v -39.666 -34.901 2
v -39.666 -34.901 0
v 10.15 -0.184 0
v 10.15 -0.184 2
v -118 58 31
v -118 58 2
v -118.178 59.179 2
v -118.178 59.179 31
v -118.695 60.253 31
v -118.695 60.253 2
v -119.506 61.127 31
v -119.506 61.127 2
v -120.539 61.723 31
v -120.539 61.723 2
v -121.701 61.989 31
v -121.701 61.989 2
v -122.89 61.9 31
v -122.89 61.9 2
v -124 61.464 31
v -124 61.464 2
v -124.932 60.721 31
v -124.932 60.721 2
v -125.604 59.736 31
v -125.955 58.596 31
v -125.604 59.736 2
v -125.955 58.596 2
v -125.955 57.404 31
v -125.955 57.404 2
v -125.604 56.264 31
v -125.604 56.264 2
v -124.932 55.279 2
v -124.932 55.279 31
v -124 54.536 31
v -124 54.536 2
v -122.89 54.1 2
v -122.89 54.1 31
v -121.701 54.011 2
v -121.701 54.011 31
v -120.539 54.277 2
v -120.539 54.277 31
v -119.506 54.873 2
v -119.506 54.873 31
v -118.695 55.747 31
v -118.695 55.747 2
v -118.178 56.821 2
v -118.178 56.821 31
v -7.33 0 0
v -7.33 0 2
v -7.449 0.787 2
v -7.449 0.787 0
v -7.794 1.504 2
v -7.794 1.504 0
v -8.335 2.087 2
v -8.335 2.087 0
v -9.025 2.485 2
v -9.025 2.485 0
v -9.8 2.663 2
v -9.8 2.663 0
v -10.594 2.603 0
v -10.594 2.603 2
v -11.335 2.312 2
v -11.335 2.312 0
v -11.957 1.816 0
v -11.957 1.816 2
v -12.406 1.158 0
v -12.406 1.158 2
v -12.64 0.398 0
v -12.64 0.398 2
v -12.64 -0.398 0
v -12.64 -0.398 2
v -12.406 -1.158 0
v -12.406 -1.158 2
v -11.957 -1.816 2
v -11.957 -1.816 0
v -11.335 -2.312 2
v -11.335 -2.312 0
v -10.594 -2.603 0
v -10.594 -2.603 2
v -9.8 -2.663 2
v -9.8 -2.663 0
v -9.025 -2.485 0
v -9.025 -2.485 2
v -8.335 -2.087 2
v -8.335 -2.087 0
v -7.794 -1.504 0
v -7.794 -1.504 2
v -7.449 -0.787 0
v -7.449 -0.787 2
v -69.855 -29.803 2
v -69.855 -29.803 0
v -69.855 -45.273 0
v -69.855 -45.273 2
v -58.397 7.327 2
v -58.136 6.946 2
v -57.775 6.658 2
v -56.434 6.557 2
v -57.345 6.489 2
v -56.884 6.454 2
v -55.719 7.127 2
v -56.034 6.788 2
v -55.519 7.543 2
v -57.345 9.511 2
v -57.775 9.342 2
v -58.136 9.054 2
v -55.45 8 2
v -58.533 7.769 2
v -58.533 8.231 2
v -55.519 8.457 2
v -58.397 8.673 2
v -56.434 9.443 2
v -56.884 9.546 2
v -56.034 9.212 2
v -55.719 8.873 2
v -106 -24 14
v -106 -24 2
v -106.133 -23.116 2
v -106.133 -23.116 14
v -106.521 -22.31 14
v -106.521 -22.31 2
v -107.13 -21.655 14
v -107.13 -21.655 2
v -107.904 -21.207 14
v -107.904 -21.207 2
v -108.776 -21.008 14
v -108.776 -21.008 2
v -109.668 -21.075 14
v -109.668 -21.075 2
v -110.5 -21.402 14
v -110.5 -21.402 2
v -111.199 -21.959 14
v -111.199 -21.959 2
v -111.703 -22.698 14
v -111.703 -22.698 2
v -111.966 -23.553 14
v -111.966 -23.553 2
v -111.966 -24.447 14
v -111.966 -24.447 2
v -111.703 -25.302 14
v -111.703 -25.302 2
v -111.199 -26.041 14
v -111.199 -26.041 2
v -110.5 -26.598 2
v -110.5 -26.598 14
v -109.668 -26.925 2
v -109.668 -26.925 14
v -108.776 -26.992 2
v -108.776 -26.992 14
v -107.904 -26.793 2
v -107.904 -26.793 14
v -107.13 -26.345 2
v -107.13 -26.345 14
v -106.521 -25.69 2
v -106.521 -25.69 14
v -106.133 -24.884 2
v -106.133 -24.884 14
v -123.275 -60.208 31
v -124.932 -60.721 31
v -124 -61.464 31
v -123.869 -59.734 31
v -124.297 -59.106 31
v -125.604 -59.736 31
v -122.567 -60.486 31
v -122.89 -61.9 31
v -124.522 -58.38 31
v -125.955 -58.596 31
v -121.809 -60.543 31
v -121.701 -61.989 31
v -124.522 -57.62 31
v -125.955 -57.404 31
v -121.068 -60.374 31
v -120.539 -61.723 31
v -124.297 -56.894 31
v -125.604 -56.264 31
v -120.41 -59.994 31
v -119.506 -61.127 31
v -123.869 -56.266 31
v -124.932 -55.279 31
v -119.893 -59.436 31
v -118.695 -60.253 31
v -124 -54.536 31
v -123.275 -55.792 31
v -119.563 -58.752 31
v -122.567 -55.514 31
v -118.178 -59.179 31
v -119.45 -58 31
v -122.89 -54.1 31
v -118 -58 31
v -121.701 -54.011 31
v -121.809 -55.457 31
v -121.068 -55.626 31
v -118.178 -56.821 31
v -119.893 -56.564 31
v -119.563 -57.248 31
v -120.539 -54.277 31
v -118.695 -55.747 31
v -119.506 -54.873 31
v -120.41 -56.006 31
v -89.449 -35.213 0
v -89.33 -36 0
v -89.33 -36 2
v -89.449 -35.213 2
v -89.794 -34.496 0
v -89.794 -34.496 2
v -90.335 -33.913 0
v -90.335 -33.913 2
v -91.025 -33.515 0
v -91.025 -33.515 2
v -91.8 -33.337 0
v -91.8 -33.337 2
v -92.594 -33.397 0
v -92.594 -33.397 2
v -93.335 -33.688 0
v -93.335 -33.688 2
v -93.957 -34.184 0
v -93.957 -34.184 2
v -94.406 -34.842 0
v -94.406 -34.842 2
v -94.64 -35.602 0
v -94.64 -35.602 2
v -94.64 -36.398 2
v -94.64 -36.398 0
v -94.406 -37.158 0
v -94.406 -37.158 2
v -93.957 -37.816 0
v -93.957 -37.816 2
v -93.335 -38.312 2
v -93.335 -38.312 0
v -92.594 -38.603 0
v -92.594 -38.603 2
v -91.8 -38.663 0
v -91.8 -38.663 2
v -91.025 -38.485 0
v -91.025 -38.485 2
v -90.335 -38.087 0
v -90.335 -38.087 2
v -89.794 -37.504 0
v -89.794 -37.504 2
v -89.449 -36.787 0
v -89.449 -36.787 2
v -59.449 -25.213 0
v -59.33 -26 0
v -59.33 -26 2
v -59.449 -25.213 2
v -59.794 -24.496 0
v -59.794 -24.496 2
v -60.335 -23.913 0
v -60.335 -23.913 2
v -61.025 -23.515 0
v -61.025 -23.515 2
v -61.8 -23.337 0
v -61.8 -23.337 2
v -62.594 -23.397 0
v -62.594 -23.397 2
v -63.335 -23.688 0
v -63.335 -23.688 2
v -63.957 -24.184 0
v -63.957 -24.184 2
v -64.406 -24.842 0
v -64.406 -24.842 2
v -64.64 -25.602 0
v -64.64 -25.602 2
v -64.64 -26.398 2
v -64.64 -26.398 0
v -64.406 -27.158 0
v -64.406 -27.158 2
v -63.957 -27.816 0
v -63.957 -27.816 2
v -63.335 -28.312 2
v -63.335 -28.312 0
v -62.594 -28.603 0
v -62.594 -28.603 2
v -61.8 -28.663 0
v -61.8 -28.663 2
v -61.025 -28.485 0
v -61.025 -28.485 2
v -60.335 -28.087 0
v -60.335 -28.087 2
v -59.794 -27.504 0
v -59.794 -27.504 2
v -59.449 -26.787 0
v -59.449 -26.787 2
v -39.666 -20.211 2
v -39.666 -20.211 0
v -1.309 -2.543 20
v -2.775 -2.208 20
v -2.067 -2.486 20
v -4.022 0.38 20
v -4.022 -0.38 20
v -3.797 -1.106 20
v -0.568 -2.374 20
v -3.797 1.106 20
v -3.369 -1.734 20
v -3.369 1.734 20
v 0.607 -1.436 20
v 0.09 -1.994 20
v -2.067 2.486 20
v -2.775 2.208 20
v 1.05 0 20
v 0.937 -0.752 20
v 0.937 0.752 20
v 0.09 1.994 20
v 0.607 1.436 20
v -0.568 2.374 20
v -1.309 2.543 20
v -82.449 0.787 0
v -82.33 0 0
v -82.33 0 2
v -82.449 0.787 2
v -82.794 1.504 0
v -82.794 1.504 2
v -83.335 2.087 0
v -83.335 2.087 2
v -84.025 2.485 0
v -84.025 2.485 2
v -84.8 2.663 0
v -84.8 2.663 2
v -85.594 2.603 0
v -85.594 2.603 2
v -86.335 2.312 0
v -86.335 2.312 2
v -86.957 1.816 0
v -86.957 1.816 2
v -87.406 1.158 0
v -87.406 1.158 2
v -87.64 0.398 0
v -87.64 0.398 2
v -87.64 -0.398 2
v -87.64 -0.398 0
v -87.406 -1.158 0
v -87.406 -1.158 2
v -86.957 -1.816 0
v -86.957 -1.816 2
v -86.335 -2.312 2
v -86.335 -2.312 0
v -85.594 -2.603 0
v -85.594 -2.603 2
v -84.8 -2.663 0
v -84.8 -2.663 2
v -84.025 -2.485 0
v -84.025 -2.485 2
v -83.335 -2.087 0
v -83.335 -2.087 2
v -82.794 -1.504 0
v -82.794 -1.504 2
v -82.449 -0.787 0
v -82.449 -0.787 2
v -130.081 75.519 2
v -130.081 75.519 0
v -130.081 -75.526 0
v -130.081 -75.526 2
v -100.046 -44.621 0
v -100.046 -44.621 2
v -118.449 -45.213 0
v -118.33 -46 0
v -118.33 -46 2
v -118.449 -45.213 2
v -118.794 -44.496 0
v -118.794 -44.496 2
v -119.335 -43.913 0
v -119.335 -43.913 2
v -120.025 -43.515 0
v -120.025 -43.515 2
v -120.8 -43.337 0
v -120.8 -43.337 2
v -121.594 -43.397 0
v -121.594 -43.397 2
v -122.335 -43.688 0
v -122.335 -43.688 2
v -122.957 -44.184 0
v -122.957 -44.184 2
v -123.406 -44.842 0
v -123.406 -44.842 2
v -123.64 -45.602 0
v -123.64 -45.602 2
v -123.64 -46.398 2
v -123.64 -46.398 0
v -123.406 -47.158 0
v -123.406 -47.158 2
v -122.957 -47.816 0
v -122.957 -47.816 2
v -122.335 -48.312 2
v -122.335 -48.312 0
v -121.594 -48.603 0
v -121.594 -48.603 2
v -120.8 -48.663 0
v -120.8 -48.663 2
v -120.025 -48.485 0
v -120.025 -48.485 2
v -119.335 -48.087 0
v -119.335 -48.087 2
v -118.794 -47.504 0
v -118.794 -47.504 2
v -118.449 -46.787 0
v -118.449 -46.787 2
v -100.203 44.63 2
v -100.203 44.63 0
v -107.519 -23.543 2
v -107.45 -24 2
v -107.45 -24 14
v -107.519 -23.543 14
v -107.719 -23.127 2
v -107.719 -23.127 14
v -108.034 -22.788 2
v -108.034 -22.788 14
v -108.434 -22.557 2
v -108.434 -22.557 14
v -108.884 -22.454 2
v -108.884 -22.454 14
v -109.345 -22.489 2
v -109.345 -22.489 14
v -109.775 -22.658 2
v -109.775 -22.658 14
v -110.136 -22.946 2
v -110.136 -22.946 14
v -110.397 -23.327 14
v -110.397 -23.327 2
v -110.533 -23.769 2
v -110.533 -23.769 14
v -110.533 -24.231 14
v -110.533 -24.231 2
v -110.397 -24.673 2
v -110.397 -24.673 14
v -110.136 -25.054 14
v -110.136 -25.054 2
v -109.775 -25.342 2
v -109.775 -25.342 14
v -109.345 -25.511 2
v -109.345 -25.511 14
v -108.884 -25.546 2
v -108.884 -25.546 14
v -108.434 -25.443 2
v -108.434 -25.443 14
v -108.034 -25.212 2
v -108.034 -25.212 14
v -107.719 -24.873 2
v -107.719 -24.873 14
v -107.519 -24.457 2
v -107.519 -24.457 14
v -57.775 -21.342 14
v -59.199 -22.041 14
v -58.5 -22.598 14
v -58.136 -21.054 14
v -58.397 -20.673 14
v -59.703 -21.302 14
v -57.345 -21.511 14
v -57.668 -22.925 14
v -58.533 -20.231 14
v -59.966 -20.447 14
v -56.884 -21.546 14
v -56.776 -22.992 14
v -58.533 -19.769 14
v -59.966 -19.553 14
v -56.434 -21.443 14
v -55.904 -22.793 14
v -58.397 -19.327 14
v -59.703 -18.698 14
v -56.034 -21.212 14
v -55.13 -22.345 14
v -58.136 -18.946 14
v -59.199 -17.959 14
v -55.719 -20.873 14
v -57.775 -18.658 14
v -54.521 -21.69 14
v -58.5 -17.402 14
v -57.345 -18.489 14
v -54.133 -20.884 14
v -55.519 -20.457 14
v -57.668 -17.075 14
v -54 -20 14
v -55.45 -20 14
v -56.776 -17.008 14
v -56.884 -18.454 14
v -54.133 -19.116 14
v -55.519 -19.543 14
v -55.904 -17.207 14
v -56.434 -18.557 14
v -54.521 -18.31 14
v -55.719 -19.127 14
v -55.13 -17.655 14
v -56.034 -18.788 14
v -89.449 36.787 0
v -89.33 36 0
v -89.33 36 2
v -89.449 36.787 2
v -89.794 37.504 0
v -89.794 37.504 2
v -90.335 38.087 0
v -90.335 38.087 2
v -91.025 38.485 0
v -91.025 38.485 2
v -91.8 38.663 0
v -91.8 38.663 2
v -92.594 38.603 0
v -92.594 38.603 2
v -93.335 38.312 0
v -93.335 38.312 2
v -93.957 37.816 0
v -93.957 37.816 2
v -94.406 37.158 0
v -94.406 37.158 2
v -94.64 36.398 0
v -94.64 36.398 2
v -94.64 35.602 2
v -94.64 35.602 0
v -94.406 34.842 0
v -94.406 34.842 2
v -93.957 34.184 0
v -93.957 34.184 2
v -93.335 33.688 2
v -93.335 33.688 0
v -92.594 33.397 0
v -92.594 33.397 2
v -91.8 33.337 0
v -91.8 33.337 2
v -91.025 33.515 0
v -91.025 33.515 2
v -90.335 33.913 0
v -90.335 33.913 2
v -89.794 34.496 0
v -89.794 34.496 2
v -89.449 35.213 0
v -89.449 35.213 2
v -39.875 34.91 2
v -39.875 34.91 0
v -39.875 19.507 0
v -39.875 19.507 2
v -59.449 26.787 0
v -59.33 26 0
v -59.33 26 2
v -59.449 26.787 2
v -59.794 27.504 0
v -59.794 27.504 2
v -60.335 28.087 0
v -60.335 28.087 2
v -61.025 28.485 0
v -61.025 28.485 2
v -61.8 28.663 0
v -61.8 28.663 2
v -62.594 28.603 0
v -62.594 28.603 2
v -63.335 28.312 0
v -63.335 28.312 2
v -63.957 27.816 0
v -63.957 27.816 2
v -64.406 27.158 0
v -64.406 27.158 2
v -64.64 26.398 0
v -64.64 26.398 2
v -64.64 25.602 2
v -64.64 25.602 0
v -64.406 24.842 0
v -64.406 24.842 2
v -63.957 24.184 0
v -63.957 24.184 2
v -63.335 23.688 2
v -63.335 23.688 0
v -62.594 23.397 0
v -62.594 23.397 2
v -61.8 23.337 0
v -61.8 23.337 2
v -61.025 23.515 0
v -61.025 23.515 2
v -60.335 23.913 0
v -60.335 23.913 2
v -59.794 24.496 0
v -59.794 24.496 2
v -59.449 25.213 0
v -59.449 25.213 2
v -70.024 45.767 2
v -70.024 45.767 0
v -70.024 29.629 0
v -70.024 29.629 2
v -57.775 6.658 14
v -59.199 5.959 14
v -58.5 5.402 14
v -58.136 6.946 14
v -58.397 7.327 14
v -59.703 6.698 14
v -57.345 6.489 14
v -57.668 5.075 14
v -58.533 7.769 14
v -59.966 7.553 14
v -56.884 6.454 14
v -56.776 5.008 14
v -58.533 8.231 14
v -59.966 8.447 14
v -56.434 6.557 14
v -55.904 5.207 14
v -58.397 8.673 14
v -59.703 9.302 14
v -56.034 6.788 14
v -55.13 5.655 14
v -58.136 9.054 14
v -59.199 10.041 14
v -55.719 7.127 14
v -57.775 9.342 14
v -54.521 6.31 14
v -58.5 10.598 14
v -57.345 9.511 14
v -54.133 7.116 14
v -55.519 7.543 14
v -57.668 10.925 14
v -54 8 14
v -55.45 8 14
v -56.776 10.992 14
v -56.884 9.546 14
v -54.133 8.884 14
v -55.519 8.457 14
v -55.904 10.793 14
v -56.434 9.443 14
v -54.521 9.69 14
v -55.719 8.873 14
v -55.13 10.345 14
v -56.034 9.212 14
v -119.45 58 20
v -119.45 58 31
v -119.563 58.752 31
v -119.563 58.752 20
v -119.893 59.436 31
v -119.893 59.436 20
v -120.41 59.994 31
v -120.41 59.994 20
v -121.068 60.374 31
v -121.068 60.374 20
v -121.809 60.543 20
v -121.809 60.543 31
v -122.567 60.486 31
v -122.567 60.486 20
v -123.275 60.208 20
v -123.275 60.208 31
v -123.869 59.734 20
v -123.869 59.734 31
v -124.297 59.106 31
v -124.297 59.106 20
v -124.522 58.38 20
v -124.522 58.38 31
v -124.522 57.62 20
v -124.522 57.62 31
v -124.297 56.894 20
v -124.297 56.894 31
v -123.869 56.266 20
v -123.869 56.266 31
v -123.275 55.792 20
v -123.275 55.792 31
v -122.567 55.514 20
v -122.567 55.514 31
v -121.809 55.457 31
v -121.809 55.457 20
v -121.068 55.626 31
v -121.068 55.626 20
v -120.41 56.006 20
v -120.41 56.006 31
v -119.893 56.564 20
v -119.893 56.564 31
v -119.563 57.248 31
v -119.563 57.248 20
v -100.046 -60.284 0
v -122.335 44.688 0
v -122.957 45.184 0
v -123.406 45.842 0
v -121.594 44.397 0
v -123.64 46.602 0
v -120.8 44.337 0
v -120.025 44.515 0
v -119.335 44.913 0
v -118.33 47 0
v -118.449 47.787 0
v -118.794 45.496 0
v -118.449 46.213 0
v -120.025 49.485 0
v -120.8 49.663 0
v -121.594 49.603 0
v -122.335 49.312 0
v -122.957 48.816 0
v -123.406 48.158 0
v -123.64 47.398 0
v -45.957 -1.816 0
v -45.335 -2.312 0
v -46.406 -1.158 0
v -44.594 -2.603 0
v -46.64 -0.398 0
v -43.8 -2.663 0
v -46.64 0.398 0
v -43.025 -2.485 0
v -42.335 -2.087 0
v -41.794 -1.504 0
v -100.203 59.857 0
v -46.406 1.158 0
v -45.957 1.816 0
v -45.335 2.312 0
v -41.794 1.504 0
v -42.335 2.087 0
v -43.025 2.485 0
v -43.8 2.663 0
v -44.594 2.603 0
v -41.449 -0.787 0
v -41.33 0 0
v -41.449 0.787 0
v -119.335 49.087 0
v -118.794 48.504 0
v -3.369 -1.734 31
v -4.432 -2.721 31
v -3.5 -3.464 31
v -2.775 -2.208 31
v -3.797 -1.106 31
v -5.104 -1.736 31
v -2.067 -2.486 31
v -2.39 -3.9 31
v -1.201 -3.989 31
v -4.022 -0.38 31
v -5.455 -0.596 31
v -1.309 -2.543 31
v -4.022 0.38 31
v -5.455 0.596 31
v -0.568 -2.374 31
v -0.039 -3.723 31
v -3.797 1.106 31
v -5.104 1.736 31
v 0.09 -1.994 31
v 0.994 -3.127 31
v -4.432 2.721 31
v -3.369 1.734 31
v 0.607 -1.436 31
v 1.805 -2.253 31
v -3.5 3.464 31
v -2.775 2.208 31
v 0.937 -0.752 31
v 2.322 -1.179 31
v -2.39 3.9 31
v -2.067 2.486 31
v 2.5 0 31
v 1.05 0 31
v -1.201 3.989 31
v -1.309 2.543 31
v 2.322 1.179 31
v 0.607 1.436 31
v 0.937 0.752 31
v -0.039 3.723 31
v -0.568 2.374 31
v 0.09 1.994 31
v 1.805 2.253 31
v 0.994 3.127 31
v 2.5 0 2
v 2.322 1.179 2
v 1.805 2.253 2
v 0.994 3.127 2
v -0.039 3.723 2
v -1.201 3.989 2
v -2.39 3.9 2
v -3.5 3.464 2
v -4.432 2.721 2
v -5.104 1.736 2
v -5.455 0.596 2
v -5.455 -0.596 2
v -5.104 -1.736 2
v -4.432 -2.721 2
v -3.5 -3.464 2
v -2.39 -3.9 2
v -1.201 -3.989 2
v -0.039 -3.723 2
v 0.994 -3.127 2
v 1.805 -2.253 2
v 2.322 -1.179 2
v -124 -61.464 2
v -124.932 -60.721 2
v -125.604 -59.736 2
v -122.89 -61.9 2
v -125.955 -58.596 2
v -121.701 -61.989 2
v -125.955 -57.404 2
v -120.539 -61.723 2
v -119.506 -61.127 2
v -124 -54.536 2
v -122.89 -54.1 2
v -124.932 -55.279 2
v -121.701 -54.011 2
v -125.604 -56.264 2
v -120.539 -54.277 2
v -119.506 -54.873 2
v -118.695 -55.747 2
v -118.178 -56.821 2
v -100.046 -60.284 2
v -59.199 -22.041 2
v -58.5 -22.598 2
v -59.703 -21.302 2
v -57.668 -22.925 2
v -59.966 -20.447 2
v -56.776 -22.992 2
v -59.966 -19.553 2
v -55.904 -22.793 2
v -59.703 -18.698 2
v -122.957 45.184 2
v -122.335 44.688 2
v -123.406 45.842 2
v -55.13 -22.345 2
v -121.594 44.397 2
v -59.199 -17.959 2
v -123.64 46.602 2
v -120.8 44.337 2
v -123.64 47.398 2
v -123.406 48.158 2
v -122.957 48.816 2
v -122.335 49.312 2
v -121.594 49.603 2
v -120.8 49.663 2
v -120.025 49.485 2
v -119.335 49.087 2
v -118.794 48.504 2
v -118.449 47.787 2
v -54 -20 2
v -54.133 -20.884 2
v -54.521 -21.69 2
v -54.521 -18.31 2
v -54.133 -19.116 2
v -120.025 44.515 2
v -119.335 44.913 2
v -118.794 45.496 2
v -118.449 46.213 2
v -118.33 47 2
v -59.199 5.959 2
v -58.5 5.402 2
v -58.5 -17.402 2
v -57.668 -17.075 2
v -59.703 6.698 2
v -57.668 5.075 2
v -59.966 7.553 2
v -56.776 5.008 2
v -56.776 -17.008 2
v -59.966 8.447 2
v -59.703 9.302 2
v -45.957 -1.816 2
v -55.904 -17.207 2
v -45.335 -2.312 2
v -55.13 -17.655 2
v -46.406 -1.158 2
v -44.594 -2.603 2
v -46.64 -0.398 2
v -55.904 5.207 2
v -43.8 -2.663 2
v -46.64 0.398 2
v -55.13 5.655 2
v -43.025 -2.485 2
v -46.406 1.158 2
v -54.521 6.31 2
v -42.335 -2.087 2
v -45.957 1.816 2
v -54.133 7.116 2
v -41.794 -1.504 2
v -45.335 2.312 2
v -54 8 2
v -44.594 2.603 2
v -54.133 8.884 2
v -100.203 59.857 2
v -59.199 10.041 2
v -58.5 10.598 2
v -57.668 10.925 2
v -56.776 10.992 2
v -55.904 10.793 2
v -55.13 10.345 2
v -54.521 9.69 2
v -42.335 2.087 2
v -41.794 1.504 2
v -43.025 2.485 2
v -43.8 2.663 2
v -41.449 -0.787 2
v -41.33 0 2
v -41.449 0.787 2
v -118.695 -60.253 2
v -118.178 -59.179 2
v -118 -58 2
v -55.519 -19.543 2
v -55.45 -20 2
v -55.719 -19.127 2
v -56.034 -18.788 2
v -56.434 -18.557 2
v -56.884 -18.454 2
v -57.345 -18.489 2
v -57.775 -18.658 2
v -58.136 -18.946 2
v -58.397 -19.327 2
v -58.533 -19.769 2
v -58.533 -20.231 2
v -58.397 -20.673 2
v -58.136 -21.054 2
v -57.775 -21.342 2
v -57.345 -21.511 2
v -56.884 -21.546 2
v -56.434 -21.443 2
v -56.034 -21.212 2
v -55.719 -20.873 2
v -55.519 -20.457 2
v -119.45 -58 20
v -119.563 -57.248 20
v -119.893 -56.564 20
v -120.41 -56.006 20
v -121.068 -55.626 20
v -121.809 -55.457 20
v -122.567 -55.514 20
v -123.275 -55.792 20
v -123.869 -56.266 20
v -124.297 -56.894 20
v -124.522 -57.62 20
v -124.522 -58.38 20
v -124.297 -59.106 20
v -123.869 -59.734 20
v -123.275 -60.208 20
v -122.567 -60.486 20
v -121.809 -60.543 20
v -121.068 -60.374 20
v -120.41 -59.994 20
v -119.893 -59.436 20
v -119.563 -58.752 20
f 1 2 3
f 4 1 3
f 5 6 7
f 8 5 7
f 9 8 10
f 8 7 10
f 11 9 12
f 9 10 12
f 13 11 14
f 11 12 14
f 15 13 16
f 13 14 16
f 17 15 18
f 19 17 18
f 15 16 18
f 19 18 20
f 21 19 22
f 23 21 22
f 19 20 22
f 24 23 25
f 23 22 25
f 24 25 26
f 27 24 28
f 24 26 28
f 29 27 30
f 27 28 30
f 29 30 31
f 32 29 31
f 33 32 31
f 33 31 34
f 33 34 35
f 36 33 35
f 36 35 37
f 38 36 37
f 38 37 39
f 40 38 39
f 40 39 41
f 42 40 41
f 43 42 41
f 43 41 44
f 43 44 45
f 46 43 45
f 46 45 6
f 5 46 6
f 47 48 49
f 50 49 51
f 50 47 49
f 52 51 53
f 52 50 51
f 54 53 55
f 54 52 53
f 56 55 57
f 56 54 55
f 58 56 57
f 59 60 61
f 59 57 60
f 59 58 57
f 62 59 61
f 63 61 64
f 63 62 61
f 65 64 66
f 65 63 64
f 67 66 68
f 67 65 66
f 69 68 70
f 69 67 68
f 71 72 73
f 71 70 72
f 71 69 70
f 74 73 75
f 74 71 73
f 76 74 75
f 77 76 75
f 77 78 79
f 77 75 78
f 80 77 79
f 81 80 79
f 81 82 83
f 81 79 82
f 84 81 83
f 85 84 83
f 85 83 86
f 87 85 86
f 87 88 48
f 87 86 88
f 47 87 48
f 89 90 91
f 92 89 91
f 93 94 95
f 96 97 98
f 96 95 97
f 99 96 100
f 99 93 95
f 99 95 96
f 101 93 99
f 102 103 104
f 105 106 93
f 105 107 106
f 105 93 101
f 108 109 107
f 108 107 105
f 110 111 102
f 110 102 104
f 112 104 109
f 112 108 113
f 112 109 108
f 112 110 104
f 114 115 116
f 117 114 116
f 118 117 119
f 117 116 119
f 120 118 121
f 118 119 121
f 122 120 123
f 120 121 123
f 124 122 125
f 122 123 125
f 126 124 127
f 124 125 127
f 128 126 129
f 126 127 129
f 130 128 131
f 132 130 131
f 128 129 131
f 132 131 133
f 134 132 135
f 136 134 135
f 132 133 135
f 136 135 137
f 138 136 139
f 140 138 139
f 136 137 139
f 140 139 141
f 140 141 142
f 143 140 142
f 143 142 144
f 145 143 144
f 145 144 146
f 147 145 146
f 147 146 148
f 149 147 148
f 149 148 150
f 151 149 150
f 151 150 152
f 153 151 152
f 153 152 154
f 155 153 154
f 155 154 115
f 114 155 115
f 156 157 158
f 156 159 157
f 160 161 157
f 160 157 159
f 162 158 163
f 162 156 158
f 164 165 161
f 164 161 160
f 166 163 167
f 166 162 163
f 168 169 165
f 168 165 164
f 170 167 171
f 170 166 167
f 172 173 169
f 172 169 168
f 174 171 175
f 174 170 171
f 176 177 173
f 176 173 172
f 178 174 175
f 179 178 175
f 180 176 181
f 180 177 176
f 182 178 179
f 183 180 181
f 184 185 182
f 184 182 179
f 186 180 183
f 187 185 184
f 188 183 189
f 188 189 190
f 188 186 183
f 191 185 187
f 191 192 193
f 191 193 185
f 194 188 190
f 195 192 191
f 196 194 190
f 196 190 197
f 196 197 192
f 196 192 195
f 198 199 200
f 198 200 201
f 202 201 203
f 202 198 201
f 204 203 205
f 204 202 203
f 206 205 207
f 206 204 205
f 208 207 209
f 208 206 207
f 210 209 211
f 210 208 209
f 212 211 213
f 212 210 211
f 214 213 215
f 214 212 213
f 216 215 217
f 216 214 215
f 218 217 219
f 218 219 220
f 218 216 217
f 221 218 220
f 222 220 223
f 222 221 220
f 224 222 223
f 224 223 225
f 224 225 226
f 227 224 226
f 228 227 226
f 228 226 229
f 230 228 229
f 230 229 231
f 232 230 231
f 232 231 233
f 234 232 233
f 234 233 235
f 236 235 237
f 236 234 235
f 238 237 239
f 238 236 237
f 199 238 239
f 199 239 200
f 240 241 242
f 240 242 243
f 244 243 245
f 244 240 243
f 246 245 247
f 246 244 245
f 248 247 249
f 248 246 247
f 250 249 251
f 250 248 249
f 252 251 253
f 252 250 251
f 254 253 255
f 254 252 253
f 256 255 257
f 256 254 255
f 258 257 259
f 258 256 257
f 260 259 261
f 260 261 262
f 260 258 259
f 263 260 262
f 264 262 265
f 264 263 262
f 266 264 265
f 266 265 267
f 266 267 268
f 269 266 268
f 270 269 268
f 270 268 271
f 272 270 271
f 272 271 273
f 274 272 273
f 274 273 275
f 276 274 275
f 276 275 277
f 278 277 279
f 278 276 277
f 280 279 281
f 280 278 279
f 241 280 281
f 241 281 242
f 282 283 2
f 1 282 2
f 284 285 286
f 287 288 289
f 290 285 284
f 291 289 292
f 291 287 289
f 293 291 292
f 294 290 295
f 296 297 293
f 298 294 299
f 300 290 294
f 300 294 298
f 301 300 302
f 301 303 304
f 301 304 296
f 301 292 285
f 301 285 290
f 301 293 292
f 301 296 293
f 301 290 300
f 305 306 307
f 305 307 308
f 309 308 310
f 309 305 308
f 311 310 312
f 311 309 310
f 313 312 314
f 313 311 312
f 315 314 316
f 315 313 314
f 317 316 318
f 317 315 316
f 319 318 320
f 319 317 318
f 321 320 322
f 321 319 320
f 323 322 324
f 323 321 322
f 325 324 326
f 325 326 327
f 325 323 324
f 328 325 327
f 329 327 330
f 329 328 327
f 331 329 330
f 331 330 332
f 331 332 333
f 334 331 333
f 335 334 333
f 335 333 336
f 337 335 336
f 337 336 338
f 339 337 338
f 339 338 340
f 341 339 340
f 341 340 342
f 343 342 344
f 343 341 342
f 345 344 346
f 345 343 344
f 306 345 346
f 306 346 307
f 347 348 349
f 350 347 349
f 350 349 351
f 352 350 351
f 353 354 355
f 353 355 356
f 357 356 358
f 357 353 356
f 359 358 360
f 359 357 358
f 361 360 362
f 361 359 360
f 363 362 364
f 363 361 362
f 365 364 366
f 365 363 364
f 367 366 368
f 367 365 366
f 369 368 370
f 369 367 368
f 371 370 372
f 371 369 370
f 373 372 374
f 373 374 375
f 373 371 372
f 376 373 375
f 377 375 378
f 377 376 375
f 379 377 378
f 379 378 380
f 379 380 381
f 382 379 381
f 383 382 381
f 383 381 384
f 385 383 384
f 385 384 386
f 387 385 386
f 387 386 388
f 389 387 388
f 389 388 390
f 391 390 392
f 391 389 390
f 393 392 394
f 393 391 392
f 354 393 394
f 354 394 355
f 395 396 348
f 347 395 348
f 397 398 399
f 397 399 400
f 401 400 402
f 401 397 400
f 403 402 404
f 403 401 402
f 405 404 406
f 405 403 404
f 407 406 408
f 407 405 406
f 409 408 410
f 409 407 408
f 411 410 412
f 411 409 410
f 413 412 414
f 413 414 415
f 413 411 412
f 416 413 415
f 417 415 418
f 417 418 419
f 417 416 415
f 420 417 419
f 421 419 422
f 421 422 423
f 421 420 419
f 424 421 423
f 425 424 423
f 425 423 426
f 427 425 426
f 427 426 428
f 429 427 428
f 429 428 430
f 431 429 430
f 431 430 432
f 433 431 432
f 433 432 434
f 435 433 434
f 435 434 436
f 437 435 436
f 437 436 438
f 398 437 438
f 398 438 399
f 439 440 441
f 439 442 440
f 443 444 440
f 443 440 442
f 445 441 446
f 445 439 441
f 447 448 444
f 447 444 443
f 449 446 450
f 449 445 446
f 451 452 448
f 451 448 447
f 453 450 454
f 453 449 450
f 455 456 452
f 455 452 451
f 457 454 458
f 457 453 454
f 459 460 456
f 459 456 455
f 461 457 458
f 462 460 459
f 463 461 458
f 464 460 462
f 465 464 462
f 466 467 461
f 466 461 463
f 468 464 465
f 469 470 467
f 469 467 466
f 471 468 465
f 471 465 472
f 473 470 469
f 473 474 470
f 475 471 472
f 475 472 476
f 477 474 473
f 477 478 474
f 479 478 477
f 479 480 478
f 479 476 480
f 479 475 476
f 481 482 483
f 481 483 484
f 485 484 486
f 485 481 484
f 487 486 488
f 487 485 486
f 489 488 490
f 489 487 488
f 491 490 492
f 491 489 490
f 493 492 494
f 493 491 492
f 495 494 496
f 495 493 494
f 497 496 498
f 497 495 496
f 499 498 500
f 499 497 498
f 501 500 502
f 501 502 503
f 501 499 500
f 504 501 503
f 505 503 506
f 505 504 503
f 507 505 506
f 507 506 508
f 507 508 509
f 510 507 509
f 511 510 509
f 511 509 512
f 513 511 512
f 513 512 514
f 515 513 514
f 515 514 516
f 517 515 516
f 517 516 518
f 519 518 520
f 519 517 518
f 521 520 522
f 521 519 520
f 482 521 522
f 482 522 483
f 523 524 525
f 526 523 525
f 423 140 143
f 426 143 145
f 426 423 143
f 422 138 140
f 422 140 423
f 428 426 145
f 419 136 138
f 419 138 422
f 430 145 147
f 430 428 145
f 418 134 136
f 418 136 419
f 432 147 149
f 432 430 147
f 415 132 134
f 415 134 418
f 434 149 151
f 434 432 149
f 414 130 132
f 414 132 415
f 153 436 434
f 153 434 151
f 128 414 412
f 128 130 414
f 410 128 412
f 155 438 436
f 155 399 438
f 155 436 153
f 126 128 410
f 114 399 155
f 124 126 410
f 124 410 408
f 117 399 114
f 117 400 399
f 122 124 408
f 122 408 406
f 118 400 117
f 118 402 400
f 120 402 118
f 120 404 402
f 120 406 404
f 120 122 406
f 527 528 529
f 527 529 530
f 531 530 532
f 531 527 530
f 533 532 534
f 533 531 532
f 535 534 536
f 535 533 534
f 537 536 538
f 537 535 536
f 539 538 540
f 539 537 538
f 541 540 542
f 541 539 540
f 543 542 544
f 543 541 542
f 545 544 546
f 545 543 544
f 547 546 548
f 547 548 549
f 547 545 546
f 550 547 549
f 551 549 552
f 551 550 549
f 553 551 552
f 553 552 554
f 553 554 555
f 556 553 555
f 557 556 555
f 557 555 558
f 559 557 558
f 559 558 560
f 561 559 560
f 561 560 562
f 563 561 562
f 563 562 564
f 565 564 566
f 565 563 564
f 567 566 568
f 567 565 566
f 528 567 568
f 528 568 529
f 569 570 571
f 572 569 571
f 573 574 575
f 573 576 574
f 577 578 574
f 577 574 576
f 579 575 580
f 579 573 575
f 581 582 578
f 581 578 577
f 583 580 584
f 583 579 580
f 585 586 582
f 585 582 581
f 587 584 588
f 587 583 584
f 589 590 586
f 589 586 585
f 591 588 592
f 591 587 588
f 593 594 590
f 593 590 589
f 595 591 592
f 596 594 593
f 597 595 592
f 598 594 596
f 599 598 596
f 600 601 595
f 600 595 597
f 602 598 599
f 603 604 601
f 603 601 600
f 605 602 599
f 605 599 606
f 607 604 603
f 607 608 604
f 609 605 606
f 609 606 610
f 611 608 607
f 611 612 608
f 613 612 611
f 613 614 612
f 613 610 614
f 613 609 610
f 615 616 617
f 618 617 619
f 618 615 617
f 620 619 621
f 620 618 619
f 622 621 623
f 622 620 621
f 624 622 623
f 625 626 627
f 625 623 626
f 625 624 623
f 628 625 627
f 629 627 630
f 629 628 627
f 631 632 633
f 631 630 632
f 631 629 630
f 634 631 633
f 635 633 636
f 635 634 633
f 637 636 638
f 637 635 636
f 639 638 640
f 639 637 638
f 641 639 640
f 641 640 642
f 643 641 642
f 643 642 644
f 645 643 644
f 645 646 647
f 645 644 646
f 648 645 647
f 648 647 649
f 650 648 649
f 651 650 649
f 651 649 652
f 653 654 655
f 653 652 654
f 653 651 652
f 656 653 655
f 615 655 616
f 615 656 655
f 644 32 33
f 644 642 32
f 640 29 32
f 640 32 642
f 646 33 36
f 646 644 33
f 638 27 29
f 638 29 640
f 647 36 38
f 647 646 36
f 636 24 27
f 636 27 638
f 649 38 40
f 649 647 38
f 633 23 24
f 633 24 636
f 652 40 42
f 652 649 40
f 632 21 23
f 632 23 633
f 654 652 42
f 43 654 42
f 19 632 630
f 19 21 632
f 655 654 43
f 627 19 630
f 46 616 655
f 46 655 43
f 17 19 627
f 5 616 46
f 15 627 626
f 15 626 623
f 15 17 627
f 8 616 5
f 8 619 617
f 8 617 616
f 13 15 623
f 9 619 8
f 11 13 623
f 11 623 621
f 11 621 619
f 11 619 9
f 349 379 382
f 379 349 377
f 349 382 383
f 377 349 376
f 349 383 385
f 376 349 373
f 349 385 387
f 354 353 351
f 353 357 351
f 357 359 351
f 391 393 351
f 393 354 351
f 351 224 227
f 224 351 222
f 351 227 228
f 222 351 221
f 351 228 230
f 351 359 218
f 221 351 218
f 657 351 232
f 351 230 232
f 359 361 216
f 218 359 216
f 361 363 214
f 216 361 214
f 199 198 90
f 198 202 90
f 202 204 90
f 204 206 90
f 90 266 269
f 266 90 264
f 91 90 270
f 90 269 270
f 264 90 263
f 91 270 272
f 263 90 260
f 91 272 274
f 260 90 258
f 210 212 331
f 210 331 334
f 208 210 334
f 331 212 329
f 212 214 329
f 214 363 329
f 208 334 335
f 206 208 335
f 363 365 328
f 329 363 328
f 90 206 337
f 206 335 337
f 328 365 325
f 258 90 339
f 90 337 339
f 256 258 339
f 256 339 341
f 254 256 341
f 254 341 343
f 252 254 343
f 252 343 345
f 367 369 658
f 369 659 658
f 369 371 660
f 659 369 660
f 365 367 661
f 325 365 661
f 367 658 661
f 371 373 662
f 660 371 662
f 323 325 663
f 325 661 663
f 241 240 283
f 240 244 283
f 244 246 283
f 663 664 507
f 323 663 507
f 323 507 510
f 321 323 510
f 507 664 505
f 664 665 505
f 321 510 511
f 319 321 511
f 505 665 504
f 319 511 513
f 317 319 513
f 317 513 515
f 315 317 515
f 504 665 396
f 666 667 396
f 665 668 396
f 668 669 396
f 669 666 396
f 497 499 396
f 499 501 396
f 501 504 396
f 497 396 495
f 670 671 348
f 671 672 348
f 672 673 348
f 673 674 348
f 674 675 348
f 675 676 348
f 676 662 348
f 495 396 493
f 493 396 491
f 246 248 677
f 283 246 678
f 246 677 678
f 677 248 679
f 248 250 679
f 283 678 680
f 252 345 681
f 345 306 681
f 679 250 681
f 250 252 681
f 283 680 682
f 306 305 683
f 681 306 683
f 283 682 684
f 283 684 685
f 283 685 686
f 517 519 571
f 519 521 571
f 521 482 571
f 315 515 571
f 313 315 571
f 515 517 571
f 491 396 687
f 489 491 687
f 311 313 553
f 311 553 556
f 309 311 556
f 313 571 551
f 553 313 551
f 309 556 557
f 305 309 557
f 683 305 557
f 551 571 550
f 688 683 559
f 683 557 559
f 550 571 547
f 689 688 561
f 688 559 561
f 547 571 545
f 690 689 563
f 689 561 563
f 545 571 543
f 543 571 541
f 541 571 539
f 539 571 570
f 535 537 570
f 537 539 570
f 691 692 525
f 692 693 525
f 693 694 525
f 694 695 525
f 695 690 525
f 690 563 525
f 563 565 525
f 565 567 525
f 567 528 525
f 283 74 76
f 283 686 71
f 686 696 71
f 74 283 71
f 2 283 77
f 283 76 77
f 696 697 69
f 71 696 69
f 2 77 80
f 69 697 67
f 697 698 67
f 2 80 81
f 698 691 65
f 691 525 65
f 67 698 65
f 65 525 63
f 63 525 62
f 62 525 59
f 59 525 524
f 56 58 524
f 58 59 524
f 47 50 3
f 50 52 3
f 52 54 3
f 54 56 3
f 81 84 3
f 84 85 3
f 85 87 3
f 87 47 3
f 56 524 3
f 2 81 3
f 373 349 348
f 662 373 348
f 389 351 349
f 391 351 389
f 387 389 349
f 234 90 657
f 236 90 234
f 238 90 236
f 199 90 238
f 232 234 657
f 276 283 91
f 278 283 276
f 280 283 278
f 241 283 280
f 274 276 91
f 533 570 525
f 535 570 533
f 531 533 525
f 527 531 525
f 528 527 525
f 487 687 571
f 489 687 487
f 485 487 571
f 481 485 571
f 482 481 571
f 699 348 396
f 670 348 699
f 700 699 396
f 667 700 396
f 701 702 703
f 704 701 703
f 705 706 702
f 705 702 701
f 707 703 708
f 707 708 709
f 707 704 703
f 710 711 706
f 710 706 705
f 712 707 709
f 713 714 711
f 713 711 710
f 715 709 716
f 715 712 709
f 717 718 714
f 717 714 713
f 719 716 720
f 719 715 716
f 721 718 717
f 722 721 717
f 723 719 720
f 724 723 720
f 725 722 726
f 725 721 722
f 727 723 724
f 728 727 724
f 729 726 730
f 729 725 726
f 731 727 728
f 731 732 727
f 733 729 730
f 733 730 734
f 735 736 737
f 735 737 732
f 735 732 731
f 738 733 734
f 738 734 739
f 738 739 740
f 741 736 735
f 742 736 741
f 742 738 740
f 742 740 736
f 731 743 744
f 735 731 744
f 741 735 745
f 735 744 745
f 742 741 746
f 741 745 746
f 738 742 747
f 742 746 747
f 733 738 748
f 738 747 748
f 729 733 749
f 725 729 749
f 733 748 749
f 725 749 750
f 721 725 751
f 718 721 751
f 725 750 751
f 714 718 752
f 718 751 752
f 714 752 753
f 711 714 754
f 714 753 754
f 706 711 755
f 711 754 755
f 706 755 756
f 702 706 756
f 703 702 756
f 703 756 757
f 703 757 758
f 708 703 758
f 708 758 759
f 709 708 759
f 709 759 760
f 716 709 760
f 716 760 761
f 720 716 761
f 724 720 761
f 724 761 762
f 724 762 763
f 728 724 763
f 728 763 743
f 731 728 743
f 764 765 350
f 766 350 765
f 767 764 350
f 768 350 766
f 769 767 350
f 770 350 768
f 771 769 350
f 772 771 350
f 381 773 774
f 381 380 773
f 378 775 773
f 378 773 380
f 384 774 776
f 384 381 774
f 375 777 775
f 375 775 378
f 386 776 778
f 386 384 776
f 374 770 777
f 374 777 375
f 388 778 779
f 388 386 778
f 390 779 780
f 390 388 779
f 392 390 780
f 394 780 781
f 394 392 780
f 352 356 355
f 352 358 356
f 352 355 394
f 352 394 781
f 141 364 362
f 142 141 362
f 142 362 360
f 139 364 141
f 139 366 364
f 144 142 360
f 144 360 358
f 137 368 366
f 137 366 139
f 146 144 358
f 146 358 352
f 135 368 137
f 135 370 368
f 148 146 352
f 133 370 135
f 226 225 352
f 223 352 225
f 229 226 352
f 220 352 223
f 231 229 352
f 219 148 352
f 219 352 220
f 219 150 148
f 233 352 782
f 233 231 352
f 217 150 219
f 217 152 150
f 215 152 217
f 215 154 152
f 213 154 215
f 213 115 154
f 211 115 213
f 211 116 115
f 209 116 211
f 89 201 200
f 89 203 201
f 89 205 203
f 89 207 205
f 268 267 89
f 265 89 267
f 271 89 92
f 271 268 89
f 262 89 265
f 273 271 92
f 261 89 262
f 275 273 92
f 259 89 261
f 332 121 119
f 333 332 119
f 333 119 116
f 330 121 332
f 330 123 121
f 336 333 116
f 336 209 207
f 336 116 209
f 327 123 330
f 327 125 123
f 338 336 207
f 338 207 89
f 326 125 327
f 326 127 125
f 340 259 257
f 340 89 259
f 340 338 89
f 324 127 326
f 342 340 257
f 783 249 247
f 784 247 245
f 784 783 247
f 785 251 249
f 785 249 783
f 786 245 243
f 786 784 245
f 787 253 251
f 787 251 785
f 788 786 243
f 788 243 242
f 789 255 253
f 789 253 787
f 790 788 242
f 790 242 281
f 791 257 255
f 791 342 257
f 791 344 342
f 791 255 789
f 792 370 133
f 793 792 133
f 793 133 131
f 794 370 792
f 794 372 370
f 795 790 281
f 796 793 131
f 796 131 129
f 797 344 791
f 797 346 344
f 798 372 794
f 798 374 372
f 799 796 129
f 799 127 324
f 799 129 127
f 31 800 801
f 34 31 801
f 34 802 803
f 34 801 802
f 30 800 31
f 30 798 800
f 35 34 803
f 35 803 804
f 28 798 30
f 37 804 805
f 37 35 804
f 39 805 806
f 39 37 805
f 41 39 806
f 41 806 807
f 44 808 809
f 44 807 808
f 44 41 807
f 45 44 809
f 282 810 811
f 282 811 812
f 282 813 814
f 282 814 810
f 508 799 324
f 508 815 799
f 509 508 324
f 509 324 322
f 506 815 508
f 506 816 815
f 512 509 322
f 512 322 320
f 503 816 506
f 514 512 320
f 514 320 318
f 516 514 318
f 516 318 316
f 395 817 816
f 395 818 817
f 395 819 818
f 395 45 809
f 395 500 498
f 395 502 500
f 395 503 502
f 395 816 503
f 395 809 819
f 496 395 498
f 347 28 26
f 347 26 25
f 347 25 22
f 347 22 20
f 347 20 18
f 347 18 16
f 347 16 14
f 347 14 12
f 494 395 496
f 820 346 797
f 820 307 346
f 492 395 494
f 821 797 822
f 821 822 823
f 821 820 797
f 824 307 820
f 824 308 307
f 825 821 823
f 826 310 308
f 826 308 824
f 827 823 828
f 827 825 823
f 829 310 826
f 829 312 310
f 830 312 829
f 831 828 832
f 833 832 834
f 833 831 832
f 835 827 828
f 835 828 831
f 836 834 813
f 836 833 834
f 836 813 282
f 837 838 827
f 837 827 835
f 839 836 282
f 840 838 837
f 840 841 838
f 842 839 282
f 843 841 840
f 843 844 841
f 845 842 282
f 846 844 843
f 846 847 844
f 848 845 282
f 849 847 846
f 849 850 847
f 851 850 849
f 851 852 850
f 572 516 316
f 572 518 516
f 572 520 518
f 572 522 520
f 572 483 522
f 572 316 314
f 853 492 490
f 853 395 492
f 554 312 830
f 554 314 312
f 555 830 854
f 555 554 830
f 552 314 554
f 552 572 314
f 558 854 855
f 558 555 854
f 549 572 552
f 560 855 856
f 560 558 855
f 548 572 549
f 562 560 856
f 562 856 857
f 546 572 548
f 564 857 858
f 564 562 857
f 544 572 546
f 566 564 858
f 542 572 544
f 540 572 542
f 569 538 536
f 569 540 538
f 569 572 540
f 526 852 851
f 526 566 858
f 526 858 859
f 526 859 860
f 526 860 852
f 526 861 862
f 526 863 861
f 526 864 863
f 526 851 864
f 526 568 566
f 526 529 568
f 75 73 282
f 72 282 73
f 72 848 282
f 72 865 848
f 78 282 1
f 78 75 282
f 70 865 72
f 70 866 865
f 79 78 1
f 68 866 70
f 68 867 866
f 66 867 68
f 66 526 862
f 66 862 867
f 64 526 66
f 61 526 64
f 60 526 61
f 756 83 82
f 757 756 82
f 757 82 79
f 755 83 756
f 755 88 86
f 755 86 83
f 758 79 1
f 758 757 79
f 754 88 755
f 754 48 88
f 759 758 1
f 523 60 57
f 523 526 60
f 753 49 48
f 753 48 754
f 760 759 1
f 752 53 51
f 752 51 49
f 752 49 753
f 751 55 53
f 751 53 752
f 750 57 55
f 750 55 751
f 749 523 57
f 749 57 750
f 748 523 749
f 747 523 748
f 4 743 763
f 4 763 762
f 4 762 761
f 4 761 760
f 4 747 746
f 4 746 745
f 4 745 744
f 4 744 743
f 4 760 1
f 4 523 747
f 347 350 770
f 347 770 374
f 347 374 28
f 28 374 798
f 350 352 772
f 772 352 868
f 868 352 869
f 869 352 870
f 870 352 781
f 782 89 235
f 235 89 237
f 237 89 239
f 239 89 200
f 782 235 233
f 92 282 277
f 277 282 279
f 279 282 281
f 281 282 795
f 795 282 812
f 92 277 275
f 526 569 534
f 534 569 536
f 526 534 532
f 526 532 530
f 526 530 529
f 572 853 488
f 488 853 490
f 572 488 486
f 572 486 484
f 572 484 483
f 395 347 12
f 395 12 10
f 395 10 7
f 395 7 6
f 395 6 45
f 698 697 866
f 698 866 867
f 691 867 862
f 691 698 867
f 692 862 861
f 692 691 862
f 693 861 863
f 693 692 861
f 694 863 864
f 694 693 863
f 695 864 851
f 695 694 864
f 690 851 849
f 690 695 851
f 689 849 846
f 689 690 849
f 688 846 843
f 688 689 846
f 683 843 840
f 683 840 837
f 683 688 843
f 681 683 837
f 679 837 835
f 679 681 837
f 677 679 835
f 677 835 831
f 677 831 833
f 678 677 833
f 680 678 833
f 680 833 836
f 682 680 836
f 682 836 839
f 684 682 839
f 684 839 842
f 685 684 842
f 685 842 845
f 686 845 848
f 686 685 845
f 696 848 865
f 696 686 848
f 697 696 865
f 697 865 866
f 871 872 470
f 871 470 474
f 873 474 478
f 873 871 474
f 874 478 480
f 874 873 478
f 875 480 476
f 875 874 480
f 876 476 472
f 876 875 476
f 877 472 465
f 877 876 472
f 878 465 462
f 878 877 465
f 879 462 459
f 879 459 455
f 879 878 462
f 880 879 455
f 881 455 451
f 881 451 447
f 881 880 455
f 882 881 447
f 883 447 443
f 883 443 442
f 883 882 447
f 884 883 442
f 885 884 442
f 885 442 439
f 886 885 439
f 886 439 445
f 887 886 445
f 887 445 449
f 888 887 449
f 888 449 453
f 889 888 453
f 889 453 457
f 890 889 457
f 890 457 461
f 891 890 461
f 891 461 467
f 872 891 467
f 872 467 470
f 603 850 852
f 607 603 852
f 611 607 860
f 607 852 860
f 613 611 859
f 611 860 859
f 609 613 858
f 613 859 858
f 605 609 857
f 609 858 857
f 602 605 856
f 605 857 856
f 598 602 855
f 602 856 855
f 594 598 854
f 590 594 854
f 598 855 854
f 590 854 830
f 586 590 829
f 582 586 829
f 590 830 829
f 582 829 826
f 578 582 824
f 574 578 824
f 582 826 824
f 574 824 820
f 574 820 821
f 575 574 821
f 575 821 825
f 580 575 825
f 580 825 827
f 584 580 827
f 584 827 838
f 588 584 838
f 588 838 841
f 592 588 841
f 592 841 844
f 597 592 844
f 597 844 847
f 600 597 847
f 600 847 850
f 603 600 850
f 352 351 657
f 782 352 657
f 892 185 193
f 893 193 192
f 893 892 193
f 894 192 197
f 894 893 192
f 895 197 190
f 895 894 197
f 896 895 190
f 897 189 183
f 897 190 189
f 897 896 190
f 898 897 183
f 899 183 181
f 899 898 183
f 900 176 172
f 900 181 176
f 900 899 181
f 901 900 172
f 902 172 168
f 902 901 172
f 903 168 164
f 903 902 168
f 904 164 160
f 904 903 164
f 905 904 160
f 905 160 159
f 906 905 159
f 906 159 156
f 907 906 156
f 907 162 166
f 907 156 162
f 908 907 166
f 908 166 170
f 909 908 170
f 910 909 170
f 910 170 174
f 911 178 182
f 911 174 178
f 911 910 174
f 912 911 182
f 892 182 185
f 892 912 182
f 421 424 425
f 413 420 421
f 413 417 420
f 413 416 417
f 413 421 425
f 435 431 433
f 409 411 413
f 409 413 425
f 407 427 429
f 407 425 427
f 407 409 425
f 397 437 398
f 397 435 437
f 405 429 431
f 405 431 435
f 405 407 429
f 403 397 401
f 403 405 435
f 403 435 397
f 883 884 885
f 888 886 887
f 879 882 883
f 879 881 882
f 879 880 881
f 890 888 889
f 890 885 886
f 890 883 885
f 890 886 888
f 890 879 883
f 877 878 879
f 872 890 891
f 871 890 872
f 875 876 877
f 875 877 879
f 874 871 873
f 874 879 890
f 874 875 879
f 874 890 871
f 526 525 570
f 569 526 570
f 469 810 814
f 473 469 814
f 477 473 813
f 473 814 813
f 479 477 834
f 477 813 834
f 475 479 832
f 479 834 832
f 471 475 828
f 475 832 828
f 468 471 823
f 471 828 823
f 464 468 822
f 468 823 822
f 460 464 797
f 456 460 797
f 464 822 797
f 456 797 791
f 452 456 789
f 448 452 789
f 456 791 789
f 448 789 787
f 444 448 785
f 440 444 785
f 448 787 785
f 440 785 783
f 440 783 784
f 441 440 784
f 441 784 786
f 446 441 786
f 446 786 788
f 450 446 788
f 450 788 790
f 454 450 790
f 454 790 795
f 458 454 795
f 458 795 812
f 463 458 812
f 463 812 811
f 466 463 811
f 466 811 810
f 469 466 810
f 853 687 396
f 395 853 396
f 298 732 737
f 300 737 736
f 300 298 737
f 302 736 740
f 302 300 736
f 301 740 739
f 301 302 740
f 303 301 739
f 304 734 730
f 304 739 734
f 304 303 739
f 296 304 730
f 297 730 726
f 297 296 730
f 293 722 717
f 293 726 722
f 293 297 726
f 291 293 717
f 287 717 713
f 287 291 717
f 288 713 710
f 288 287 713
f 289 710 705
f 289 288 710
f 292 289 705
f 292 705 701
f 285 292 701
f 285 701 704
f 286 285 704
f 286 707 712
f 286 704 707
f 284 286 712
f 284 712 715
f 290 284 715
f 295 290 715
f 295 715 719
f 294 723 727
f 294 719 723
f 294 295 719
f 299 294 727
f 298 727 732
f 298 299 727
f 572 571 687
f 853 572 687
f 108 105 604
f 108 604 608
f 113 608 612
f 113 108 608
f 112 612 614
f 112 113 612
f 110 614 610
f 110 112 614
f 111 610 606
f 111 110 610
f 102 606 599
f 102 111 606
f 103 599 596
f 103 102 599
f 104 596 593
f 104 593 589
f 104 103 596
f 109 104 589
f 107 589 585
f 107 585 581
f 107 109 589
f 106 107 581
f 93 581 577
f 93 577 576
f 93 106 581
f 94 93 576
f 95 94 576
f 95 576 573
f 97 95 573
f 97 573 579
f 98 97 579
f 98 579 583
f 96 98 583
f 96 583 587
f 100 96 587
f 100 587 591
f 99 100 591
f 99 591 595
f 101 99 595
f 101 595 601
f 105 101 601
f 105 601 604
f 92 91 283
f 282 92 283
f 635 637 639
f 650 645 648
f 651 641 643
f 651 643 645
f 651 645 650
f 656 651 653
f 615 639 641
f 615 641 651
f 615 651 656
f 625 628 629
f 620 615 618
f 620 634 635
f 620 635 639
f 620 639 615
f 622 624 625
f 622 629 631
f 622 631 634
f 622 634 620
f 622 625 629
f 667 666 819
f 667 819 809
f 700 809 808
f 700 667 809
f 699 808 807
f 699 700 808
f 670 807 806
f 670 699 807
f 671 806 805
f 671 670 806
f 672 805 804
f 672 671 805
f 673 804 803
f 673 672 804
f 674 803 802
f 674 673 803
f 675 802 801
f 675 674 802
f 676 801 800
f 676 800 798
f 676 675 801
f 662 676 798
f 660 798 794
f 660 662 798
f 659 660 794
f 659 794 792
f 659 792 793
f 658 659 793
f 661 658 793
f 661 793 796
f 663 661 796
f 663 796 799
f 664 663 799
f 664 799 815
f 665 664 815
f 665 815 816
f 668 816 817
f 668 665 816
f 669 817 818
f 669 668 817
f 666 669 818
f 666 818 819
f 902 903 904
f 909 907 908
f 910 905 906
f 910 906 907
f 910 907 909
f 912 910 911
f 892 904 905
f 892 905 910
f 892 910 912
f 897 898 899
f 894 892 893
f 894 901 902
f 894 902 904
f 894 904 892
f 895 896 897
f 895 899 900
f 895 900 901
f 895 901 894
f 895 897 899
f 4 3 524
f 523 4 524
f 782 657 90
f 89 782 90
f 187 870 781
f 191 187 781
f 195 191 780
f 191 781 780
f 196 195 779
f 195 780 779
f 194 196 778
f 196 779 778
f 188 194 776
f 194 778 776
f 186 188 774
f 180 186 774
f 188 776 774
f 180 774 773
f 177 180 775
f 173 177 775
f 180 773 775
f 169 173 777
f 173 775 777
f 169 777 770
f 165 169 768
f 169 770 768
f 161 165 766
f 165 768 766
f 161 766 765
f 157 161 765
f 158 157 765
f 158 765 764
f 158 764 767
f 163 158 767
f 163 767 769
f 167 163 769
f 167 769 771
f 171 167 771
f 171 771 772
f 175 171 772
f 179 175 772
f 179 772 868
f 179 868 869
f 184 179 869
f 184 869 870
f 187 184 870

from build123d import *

# Parameters (mm, degrees)
CYLINDER020_R     = 2.55
CYLINDER020_DEPTH = 12
CYLINDER010_R     = 4
CYLINDER010_DEPTH = 31
CYLINDER019_R     = 2.55
CYLINDER019_DEPTH = 12
CYLINDER009_R     = 4
CYLINDER009_DEPTH = 31
CYLINDER018_R     = 2.55
CYLINDER018_DEPTH = 12
CYLINDER011_R     = 4
CYLINDER011_DEPTH = 31
CYLINDER015_R     = 1.55
CYLINDER015_DEPTH = 13
CYLINDER012_R     = 3
CYLINDER012_DEPTH = 13
CYLINDER017_R     = 1.55
CYLINDER017_DEPTH = 13
CYLINDER013_R     = 3
CYLINDER013_DEPTH = 13
CYLINDER008_R     = 2.67
CYLINDER008_DEPTH = 2
CYLINDER007_R     = 2.67
CYLINDER007_DEPTH = 2
CYLINDER006_R     = 2.67
CYLINDER006_DEPTH = 2
CYLINDER005_R     = 2.67
CYLINDER005_DEPTH = 2
CYLINDER004_R     = 2.67
CYLINDER004_DEPTH = 2
CYLINDER003_R     = 2.67
CYLINDER003_DEPTH = 2
CYLINDER002_R     = 2.67
CYLINDER002_DEPTH = 2
CYLINDER001_R     = 2.67
CYLINDER001_DEPTH = 2
CYLINDER_R        = 2.67
CYLINDER_DEPTH    = 3
PAD001_DEPTH      = 2
CYLINDER016_R     = 1.55
CYLINDER016_DEPTH = 13
CYLINDER014_R     = 3
CYLINDER014_DEPTH = 13


with BuildPart() as cylindre002:
    # Cylinder020 → Cylinder020 (new body)
    with BuildSketch(Plane(origin=(-121, 39, 20), x_dir=(1, 0, 0), z_dir=(0, 0, 1))):
        Circle(CYLINDER020_R)
    extrude(amount=CYLINDER020_DEPTH)


with BuildPart() as cut014:
    # Cylinder010 → Cylinder010 (new body)
    with BuildSketch(Plane(origin=(-121, 39, 0), x_dir=(1, 0, 0), z_dir=(0, 0, 1))):
        Circle(CYLINDER010_R)
    extrude(amount=CYLINDER010_DEPTH)

    # Cut014: cut Cylindre002
    add(cylindre002.part, mode=Mode.SUBTRACT)


with BuildPart() as cut014_1:
    # Cut014 placement: moved
    add(cut014.part.moved(Location((-1, 19, 0))))


with BuildPart() as cylindre001:
    # Cylinder019 → Cylinder019 (new body)
    with BuildSketch(Plane(origin=(-2, 0, 20), x_dir=(1, 0, 0), z_dir=(0, 0, 1))):
        Circle(CYLINDER019_R)
    extrude(amount=CYLINDER019_DEPTH)


with BuildPart() as cut013:
    # Cylinder009 → Cylinder009 (new body)
    with BuildSketch(Plane(origin=(-2, 0, 0), x_dir=(1, 0, 0), z_dir=(0, 0, 1))):
        Circle(CYLINDER009_R)
    extrude(amount=CYLINDER009_DEPTH)

    # Cut013: cut Cylindre001
    add(cylindre001.part, mode=Mode.SUBTRACT)


with BuildPart() as cut013_1:
    # Cut013 placement: moved
    add(cut013.part.moved(Location((0.5, 0, 0))))


with BuildPart() as cylindre:
    # Cylinder018 → Cylinder018 (new body)
    with BuildSketch(Plane(origin=(-121, -36, 20), x_dir=(1, 0, 0), z_dir=(0, 0, 1))):
        Circle(CYLINDER018_R)
    extrude(amount=CYLINDER018_DEPTH)


with BuildPart() as cut012:
    # Cylinder011 → Cylinder011 (new body)
    with BuildSketch(Plane(origin=(-121, -36, 0), x_dir=(1, 0, 0), z_dir=(0, 0, 1))):
        Circle(CYLINDER011_R)
    extrude(amount=CYLINDER011_DEPTH)

    # Cut012: cut Cylindre
    add(cylindre.part, mode=Mode.SUBTRACT)


with BuildPart() as cut012_1:
    # Cut012 placement: moved
    add(cut012.part.moved(Location((-1, -22, 0))))


with BuildPart() as arduino_bint:
    # Cylinder015 → Cylinder015 (new body)
    with BuildSketch(Plane(origin=(0, -140, 0), x_dir=(1, 0, 0), z_dir=(0, 0, 1))):
        Circle(CYLINDER015_R)
    extrude(amount=CYLINDER015_DEPTH)


with BuildPart() as arduino_bas:
    # Cylinder012 → Cylinder012 (new body)
    with BuildSketch(Plane(origin=(0, -140, 0), x_dir=(1, 0, 0), z_dir=(0, 0, 1))):
        Circle(CYLINDER012_R)
    extrude(amount=CYLINDER012_DEPTH)

    # Cut: cut Arduino_Bint
    add(arduino_bint.part, mode=Mode.SUBTRACT)


with BuildPart() as arduino_bas_1:
    # Cut placement: moved
    add(arduino_bas.part.moved(Location((-109, 116, 1))))


with BuildPart() as arduino_gint:
    # Cylinder017 → Cylinder017 (new body)
    with BuildSketch(Plane(origin=(0, -140, 0), x_dir=(1, 0, 0), z_dir=(0, 0, 1))):
        Circle(CYLINDER017_R)
    extrude(amount=CYLINDER017_DEPTH)


with BuildPart() as arduinog:
    # Cylinder013 → Cylinder013 (new body)
    with BuildSketch(Plane(origin=(0, -140, 0), x_dir=(1, 0, 0), z_dir=(0, 0, 1))):
        Circle(CYLINDER013_R)
    extrude(amount=CYLINDER013_DEPTH)

    # Cut001: cut Arduino_Gint
    add(arduino_gint.part, mode=Mode.SUBTRACT)


with BuildPart() as arduinog_1:
    # Cut001 placement: moved
    add(arduinog.part.moved(Location((-57, 148, 1))))


with BuildPart() as ledm2:
    # Cylinder008 → Cylinder008 (new body)
    with BuildSketch(Plane(origin=(-85, 0, 0), x_dir=(1, 0, 0), z_dir=(0, 0, 1))):
        Circle(CYLINDER008_R)
    extrude(amount=CYLINDER008_DEPTH)


with BuildPart() as ledm1:
    # Cylinder007 → Cylinder007 (new body)
    with BuildSketch(Plane(origin=(-44, 0, 0), x_dir=(1, 0, 0), z_dir=(0, 0, 1))):
        Circle(CYLINDER007_R)
    extrude(amount=CYLINDER007_DEPTH)


with BuildPart() as ledd3:
    # Cylinder006 → Cylinder006 (new body)
    with BuildSketch(Plane(origin=(-121, -46, 0), x_dir=(1, 0, 0), z_dir=(0, 0, 1))):
        Circle(CYLINDER006_R)
    extrude(amount=CYLINDER006_DEPTH)


with BuildPart() as ledd2:
    # Cylinder005 → Cylinder005 (new body)
    with BuildSketch(Plane(origin=(-92, -36, 0), x_dir=(1, 0, 0), z_dir=(0, 0, 1))):
        Circle(CYLINDER005_R)
    extrude(amount=CYLINDER005_DEPTH)


with BuildPart() as ledd1:
    # Cylinder004 → Cylinder004 (new body)
    with BuildSketch(Plane(origin=(-62, -26, 0), x_dir=(1, 0, 0), z_dir=(0, 0, 1))):
        Circle(CYLINDER004_R)
    extrude(amount=CYLINDER004_DEPTH)


with BuildPart() as ledg3:
    # Cylinder003 → Cylinder003 (new body)
    with BuildSketch(Plane(origin=(-121, 47, 0), x_dir=(1, 0, 0), z_dir=(0, 0, 1))):
        Circle(CYLINDER003_R)
    extrude(amount=CYLINDER003_DEPTH)


with BuildPart() as ledg2:
    # Cylinder002 → Cylinder002 (new body)
    with BuildSketch(Plane(origin=(-92, 36, 0), x_dir=(1, 0, 0), z_dir=(0, 0, 1))):
        Circle(CYLINDER002_R)
    extrude(amount=CYLINDER002_DEPTH)


with BuildPart() as ledg1:
    # Cylinder001 → Cylinder001 (new body)
    with BuildSketch(Plane(origin=(-62, 26, 0), x_dir=(1, 0, 0), z_dir=(0, 0, 1))):
        Circle(CYLINDER001_R)
    extrude(amount=CYLINDER001_DEPTH)


with BuildPart() as led_haut:
    # Cylinder → Cylinder (new body)
    with BuildSketch(Plane(origin=(-10, 0, 0), x_dir=(1, 0, 0), z_dir=(0, 0, 1))):
        Circle(CYLINDER_R)
    extrude(amount=CYLINDER_DEPTH)


with BuildPart() as cut011:
    # Sketch → Pad001 (new body)
    with BuildSketch(Plane.XY):
        Polygon((-130.081082, 75.519378), (-130.081082, -75.526209), (-100.046493, -44.621067), (-100.046493, -60.2838), (-69.854797, -29.802717), (-69.854797, -45.272629), (-39.66638, -20.21052), (-39.66638, -34.900669), (10.150305, -0.184029), (-39.87487, 34.909859), (-39.87487, 19.507401), (-70.024222, 45.766594), (-70.024222, 29.628657), (-100.203184, 59.856933), (-100.203184, 44.62989), align=None)
    extrude(amount=PAD001_DEPTH)

    # Cut003: cut Led_haut
    add(led_haut.part, mode=Mode.SUBTRACT)

    # Cut004: cut LedG1
    add(ledg1.part, mode=Mode.SUBTRACT)

    # Cut005: cut LedG2
    add(ledg2.part, mode=Mode.SUBTRACT)

    # Cut006: cut LedG3
    add(ledg3.part, mode=Mode.SUBTRACT)

    # Cut007: cut LedD1
    add(ledd1.part, mode=Mode.SUBTRACT)

    # Cut008: cut LedD2
    add(ledd2.part, mode=Mode.SUBTRACT)

    # Cut009: cut LedD3
    add(ledd3.part, mode=Mode.SUBTRACT)

    # Cut010: cut LedM1
    add(ledm1.part, mode=Mode.SUBTRACT)

    # Cut011: cut LedM2
    add(ledm2.part, mode=Mode.SUBTRACT)


with BuildPart() as arduino_dint:
    # Cylinder016 → Cylinder016 (new body)
    with BuildSketch(Plane(origin=(0, -140, 0), x_dir=(1, 0, 0), z_dir=(0, 0, 1))):
        Circle(CYLINDER016_R)
    extrude(amount=CYLINDER016_DEPTH)


with BuildPart() as fusion006:
    # Cylinder014 → Cylinder014 (new body)
    with BuildSketch(Plane(origin=(0, -140, 0), x_dir=(1, 0, 0), z_dir=(0, 0, 1))):
        Circle(CYLINDER014_R)
    extrude(amount=CYLINDER014_DEPTH)

    # Cut002: cut Arduino_Dint
    add(arduino_dint.part, mode=Mode.SUBTRACT)


with BuildPart() as fusion006_1:
    # Cut002 placement: moved
    add(fusion006.part.moved(Location((-57, 120, 1))))

    # Fusion002: union Cut011
    add(cut011.part)

    # Fusion: union ArduinoG
    add(arduinog_1.part)

    # Fusion003: union Arduino_bas
    add(arduino_bas_1.part)

    # Fusion004: union Cut012
    add(cut012_1.part)

    # Fusion005: union Cut013
    add(cut013_1.part)

    # Fusion006: union Cut014
    add(cut014_1.part)


solid = fusion006_1.part
